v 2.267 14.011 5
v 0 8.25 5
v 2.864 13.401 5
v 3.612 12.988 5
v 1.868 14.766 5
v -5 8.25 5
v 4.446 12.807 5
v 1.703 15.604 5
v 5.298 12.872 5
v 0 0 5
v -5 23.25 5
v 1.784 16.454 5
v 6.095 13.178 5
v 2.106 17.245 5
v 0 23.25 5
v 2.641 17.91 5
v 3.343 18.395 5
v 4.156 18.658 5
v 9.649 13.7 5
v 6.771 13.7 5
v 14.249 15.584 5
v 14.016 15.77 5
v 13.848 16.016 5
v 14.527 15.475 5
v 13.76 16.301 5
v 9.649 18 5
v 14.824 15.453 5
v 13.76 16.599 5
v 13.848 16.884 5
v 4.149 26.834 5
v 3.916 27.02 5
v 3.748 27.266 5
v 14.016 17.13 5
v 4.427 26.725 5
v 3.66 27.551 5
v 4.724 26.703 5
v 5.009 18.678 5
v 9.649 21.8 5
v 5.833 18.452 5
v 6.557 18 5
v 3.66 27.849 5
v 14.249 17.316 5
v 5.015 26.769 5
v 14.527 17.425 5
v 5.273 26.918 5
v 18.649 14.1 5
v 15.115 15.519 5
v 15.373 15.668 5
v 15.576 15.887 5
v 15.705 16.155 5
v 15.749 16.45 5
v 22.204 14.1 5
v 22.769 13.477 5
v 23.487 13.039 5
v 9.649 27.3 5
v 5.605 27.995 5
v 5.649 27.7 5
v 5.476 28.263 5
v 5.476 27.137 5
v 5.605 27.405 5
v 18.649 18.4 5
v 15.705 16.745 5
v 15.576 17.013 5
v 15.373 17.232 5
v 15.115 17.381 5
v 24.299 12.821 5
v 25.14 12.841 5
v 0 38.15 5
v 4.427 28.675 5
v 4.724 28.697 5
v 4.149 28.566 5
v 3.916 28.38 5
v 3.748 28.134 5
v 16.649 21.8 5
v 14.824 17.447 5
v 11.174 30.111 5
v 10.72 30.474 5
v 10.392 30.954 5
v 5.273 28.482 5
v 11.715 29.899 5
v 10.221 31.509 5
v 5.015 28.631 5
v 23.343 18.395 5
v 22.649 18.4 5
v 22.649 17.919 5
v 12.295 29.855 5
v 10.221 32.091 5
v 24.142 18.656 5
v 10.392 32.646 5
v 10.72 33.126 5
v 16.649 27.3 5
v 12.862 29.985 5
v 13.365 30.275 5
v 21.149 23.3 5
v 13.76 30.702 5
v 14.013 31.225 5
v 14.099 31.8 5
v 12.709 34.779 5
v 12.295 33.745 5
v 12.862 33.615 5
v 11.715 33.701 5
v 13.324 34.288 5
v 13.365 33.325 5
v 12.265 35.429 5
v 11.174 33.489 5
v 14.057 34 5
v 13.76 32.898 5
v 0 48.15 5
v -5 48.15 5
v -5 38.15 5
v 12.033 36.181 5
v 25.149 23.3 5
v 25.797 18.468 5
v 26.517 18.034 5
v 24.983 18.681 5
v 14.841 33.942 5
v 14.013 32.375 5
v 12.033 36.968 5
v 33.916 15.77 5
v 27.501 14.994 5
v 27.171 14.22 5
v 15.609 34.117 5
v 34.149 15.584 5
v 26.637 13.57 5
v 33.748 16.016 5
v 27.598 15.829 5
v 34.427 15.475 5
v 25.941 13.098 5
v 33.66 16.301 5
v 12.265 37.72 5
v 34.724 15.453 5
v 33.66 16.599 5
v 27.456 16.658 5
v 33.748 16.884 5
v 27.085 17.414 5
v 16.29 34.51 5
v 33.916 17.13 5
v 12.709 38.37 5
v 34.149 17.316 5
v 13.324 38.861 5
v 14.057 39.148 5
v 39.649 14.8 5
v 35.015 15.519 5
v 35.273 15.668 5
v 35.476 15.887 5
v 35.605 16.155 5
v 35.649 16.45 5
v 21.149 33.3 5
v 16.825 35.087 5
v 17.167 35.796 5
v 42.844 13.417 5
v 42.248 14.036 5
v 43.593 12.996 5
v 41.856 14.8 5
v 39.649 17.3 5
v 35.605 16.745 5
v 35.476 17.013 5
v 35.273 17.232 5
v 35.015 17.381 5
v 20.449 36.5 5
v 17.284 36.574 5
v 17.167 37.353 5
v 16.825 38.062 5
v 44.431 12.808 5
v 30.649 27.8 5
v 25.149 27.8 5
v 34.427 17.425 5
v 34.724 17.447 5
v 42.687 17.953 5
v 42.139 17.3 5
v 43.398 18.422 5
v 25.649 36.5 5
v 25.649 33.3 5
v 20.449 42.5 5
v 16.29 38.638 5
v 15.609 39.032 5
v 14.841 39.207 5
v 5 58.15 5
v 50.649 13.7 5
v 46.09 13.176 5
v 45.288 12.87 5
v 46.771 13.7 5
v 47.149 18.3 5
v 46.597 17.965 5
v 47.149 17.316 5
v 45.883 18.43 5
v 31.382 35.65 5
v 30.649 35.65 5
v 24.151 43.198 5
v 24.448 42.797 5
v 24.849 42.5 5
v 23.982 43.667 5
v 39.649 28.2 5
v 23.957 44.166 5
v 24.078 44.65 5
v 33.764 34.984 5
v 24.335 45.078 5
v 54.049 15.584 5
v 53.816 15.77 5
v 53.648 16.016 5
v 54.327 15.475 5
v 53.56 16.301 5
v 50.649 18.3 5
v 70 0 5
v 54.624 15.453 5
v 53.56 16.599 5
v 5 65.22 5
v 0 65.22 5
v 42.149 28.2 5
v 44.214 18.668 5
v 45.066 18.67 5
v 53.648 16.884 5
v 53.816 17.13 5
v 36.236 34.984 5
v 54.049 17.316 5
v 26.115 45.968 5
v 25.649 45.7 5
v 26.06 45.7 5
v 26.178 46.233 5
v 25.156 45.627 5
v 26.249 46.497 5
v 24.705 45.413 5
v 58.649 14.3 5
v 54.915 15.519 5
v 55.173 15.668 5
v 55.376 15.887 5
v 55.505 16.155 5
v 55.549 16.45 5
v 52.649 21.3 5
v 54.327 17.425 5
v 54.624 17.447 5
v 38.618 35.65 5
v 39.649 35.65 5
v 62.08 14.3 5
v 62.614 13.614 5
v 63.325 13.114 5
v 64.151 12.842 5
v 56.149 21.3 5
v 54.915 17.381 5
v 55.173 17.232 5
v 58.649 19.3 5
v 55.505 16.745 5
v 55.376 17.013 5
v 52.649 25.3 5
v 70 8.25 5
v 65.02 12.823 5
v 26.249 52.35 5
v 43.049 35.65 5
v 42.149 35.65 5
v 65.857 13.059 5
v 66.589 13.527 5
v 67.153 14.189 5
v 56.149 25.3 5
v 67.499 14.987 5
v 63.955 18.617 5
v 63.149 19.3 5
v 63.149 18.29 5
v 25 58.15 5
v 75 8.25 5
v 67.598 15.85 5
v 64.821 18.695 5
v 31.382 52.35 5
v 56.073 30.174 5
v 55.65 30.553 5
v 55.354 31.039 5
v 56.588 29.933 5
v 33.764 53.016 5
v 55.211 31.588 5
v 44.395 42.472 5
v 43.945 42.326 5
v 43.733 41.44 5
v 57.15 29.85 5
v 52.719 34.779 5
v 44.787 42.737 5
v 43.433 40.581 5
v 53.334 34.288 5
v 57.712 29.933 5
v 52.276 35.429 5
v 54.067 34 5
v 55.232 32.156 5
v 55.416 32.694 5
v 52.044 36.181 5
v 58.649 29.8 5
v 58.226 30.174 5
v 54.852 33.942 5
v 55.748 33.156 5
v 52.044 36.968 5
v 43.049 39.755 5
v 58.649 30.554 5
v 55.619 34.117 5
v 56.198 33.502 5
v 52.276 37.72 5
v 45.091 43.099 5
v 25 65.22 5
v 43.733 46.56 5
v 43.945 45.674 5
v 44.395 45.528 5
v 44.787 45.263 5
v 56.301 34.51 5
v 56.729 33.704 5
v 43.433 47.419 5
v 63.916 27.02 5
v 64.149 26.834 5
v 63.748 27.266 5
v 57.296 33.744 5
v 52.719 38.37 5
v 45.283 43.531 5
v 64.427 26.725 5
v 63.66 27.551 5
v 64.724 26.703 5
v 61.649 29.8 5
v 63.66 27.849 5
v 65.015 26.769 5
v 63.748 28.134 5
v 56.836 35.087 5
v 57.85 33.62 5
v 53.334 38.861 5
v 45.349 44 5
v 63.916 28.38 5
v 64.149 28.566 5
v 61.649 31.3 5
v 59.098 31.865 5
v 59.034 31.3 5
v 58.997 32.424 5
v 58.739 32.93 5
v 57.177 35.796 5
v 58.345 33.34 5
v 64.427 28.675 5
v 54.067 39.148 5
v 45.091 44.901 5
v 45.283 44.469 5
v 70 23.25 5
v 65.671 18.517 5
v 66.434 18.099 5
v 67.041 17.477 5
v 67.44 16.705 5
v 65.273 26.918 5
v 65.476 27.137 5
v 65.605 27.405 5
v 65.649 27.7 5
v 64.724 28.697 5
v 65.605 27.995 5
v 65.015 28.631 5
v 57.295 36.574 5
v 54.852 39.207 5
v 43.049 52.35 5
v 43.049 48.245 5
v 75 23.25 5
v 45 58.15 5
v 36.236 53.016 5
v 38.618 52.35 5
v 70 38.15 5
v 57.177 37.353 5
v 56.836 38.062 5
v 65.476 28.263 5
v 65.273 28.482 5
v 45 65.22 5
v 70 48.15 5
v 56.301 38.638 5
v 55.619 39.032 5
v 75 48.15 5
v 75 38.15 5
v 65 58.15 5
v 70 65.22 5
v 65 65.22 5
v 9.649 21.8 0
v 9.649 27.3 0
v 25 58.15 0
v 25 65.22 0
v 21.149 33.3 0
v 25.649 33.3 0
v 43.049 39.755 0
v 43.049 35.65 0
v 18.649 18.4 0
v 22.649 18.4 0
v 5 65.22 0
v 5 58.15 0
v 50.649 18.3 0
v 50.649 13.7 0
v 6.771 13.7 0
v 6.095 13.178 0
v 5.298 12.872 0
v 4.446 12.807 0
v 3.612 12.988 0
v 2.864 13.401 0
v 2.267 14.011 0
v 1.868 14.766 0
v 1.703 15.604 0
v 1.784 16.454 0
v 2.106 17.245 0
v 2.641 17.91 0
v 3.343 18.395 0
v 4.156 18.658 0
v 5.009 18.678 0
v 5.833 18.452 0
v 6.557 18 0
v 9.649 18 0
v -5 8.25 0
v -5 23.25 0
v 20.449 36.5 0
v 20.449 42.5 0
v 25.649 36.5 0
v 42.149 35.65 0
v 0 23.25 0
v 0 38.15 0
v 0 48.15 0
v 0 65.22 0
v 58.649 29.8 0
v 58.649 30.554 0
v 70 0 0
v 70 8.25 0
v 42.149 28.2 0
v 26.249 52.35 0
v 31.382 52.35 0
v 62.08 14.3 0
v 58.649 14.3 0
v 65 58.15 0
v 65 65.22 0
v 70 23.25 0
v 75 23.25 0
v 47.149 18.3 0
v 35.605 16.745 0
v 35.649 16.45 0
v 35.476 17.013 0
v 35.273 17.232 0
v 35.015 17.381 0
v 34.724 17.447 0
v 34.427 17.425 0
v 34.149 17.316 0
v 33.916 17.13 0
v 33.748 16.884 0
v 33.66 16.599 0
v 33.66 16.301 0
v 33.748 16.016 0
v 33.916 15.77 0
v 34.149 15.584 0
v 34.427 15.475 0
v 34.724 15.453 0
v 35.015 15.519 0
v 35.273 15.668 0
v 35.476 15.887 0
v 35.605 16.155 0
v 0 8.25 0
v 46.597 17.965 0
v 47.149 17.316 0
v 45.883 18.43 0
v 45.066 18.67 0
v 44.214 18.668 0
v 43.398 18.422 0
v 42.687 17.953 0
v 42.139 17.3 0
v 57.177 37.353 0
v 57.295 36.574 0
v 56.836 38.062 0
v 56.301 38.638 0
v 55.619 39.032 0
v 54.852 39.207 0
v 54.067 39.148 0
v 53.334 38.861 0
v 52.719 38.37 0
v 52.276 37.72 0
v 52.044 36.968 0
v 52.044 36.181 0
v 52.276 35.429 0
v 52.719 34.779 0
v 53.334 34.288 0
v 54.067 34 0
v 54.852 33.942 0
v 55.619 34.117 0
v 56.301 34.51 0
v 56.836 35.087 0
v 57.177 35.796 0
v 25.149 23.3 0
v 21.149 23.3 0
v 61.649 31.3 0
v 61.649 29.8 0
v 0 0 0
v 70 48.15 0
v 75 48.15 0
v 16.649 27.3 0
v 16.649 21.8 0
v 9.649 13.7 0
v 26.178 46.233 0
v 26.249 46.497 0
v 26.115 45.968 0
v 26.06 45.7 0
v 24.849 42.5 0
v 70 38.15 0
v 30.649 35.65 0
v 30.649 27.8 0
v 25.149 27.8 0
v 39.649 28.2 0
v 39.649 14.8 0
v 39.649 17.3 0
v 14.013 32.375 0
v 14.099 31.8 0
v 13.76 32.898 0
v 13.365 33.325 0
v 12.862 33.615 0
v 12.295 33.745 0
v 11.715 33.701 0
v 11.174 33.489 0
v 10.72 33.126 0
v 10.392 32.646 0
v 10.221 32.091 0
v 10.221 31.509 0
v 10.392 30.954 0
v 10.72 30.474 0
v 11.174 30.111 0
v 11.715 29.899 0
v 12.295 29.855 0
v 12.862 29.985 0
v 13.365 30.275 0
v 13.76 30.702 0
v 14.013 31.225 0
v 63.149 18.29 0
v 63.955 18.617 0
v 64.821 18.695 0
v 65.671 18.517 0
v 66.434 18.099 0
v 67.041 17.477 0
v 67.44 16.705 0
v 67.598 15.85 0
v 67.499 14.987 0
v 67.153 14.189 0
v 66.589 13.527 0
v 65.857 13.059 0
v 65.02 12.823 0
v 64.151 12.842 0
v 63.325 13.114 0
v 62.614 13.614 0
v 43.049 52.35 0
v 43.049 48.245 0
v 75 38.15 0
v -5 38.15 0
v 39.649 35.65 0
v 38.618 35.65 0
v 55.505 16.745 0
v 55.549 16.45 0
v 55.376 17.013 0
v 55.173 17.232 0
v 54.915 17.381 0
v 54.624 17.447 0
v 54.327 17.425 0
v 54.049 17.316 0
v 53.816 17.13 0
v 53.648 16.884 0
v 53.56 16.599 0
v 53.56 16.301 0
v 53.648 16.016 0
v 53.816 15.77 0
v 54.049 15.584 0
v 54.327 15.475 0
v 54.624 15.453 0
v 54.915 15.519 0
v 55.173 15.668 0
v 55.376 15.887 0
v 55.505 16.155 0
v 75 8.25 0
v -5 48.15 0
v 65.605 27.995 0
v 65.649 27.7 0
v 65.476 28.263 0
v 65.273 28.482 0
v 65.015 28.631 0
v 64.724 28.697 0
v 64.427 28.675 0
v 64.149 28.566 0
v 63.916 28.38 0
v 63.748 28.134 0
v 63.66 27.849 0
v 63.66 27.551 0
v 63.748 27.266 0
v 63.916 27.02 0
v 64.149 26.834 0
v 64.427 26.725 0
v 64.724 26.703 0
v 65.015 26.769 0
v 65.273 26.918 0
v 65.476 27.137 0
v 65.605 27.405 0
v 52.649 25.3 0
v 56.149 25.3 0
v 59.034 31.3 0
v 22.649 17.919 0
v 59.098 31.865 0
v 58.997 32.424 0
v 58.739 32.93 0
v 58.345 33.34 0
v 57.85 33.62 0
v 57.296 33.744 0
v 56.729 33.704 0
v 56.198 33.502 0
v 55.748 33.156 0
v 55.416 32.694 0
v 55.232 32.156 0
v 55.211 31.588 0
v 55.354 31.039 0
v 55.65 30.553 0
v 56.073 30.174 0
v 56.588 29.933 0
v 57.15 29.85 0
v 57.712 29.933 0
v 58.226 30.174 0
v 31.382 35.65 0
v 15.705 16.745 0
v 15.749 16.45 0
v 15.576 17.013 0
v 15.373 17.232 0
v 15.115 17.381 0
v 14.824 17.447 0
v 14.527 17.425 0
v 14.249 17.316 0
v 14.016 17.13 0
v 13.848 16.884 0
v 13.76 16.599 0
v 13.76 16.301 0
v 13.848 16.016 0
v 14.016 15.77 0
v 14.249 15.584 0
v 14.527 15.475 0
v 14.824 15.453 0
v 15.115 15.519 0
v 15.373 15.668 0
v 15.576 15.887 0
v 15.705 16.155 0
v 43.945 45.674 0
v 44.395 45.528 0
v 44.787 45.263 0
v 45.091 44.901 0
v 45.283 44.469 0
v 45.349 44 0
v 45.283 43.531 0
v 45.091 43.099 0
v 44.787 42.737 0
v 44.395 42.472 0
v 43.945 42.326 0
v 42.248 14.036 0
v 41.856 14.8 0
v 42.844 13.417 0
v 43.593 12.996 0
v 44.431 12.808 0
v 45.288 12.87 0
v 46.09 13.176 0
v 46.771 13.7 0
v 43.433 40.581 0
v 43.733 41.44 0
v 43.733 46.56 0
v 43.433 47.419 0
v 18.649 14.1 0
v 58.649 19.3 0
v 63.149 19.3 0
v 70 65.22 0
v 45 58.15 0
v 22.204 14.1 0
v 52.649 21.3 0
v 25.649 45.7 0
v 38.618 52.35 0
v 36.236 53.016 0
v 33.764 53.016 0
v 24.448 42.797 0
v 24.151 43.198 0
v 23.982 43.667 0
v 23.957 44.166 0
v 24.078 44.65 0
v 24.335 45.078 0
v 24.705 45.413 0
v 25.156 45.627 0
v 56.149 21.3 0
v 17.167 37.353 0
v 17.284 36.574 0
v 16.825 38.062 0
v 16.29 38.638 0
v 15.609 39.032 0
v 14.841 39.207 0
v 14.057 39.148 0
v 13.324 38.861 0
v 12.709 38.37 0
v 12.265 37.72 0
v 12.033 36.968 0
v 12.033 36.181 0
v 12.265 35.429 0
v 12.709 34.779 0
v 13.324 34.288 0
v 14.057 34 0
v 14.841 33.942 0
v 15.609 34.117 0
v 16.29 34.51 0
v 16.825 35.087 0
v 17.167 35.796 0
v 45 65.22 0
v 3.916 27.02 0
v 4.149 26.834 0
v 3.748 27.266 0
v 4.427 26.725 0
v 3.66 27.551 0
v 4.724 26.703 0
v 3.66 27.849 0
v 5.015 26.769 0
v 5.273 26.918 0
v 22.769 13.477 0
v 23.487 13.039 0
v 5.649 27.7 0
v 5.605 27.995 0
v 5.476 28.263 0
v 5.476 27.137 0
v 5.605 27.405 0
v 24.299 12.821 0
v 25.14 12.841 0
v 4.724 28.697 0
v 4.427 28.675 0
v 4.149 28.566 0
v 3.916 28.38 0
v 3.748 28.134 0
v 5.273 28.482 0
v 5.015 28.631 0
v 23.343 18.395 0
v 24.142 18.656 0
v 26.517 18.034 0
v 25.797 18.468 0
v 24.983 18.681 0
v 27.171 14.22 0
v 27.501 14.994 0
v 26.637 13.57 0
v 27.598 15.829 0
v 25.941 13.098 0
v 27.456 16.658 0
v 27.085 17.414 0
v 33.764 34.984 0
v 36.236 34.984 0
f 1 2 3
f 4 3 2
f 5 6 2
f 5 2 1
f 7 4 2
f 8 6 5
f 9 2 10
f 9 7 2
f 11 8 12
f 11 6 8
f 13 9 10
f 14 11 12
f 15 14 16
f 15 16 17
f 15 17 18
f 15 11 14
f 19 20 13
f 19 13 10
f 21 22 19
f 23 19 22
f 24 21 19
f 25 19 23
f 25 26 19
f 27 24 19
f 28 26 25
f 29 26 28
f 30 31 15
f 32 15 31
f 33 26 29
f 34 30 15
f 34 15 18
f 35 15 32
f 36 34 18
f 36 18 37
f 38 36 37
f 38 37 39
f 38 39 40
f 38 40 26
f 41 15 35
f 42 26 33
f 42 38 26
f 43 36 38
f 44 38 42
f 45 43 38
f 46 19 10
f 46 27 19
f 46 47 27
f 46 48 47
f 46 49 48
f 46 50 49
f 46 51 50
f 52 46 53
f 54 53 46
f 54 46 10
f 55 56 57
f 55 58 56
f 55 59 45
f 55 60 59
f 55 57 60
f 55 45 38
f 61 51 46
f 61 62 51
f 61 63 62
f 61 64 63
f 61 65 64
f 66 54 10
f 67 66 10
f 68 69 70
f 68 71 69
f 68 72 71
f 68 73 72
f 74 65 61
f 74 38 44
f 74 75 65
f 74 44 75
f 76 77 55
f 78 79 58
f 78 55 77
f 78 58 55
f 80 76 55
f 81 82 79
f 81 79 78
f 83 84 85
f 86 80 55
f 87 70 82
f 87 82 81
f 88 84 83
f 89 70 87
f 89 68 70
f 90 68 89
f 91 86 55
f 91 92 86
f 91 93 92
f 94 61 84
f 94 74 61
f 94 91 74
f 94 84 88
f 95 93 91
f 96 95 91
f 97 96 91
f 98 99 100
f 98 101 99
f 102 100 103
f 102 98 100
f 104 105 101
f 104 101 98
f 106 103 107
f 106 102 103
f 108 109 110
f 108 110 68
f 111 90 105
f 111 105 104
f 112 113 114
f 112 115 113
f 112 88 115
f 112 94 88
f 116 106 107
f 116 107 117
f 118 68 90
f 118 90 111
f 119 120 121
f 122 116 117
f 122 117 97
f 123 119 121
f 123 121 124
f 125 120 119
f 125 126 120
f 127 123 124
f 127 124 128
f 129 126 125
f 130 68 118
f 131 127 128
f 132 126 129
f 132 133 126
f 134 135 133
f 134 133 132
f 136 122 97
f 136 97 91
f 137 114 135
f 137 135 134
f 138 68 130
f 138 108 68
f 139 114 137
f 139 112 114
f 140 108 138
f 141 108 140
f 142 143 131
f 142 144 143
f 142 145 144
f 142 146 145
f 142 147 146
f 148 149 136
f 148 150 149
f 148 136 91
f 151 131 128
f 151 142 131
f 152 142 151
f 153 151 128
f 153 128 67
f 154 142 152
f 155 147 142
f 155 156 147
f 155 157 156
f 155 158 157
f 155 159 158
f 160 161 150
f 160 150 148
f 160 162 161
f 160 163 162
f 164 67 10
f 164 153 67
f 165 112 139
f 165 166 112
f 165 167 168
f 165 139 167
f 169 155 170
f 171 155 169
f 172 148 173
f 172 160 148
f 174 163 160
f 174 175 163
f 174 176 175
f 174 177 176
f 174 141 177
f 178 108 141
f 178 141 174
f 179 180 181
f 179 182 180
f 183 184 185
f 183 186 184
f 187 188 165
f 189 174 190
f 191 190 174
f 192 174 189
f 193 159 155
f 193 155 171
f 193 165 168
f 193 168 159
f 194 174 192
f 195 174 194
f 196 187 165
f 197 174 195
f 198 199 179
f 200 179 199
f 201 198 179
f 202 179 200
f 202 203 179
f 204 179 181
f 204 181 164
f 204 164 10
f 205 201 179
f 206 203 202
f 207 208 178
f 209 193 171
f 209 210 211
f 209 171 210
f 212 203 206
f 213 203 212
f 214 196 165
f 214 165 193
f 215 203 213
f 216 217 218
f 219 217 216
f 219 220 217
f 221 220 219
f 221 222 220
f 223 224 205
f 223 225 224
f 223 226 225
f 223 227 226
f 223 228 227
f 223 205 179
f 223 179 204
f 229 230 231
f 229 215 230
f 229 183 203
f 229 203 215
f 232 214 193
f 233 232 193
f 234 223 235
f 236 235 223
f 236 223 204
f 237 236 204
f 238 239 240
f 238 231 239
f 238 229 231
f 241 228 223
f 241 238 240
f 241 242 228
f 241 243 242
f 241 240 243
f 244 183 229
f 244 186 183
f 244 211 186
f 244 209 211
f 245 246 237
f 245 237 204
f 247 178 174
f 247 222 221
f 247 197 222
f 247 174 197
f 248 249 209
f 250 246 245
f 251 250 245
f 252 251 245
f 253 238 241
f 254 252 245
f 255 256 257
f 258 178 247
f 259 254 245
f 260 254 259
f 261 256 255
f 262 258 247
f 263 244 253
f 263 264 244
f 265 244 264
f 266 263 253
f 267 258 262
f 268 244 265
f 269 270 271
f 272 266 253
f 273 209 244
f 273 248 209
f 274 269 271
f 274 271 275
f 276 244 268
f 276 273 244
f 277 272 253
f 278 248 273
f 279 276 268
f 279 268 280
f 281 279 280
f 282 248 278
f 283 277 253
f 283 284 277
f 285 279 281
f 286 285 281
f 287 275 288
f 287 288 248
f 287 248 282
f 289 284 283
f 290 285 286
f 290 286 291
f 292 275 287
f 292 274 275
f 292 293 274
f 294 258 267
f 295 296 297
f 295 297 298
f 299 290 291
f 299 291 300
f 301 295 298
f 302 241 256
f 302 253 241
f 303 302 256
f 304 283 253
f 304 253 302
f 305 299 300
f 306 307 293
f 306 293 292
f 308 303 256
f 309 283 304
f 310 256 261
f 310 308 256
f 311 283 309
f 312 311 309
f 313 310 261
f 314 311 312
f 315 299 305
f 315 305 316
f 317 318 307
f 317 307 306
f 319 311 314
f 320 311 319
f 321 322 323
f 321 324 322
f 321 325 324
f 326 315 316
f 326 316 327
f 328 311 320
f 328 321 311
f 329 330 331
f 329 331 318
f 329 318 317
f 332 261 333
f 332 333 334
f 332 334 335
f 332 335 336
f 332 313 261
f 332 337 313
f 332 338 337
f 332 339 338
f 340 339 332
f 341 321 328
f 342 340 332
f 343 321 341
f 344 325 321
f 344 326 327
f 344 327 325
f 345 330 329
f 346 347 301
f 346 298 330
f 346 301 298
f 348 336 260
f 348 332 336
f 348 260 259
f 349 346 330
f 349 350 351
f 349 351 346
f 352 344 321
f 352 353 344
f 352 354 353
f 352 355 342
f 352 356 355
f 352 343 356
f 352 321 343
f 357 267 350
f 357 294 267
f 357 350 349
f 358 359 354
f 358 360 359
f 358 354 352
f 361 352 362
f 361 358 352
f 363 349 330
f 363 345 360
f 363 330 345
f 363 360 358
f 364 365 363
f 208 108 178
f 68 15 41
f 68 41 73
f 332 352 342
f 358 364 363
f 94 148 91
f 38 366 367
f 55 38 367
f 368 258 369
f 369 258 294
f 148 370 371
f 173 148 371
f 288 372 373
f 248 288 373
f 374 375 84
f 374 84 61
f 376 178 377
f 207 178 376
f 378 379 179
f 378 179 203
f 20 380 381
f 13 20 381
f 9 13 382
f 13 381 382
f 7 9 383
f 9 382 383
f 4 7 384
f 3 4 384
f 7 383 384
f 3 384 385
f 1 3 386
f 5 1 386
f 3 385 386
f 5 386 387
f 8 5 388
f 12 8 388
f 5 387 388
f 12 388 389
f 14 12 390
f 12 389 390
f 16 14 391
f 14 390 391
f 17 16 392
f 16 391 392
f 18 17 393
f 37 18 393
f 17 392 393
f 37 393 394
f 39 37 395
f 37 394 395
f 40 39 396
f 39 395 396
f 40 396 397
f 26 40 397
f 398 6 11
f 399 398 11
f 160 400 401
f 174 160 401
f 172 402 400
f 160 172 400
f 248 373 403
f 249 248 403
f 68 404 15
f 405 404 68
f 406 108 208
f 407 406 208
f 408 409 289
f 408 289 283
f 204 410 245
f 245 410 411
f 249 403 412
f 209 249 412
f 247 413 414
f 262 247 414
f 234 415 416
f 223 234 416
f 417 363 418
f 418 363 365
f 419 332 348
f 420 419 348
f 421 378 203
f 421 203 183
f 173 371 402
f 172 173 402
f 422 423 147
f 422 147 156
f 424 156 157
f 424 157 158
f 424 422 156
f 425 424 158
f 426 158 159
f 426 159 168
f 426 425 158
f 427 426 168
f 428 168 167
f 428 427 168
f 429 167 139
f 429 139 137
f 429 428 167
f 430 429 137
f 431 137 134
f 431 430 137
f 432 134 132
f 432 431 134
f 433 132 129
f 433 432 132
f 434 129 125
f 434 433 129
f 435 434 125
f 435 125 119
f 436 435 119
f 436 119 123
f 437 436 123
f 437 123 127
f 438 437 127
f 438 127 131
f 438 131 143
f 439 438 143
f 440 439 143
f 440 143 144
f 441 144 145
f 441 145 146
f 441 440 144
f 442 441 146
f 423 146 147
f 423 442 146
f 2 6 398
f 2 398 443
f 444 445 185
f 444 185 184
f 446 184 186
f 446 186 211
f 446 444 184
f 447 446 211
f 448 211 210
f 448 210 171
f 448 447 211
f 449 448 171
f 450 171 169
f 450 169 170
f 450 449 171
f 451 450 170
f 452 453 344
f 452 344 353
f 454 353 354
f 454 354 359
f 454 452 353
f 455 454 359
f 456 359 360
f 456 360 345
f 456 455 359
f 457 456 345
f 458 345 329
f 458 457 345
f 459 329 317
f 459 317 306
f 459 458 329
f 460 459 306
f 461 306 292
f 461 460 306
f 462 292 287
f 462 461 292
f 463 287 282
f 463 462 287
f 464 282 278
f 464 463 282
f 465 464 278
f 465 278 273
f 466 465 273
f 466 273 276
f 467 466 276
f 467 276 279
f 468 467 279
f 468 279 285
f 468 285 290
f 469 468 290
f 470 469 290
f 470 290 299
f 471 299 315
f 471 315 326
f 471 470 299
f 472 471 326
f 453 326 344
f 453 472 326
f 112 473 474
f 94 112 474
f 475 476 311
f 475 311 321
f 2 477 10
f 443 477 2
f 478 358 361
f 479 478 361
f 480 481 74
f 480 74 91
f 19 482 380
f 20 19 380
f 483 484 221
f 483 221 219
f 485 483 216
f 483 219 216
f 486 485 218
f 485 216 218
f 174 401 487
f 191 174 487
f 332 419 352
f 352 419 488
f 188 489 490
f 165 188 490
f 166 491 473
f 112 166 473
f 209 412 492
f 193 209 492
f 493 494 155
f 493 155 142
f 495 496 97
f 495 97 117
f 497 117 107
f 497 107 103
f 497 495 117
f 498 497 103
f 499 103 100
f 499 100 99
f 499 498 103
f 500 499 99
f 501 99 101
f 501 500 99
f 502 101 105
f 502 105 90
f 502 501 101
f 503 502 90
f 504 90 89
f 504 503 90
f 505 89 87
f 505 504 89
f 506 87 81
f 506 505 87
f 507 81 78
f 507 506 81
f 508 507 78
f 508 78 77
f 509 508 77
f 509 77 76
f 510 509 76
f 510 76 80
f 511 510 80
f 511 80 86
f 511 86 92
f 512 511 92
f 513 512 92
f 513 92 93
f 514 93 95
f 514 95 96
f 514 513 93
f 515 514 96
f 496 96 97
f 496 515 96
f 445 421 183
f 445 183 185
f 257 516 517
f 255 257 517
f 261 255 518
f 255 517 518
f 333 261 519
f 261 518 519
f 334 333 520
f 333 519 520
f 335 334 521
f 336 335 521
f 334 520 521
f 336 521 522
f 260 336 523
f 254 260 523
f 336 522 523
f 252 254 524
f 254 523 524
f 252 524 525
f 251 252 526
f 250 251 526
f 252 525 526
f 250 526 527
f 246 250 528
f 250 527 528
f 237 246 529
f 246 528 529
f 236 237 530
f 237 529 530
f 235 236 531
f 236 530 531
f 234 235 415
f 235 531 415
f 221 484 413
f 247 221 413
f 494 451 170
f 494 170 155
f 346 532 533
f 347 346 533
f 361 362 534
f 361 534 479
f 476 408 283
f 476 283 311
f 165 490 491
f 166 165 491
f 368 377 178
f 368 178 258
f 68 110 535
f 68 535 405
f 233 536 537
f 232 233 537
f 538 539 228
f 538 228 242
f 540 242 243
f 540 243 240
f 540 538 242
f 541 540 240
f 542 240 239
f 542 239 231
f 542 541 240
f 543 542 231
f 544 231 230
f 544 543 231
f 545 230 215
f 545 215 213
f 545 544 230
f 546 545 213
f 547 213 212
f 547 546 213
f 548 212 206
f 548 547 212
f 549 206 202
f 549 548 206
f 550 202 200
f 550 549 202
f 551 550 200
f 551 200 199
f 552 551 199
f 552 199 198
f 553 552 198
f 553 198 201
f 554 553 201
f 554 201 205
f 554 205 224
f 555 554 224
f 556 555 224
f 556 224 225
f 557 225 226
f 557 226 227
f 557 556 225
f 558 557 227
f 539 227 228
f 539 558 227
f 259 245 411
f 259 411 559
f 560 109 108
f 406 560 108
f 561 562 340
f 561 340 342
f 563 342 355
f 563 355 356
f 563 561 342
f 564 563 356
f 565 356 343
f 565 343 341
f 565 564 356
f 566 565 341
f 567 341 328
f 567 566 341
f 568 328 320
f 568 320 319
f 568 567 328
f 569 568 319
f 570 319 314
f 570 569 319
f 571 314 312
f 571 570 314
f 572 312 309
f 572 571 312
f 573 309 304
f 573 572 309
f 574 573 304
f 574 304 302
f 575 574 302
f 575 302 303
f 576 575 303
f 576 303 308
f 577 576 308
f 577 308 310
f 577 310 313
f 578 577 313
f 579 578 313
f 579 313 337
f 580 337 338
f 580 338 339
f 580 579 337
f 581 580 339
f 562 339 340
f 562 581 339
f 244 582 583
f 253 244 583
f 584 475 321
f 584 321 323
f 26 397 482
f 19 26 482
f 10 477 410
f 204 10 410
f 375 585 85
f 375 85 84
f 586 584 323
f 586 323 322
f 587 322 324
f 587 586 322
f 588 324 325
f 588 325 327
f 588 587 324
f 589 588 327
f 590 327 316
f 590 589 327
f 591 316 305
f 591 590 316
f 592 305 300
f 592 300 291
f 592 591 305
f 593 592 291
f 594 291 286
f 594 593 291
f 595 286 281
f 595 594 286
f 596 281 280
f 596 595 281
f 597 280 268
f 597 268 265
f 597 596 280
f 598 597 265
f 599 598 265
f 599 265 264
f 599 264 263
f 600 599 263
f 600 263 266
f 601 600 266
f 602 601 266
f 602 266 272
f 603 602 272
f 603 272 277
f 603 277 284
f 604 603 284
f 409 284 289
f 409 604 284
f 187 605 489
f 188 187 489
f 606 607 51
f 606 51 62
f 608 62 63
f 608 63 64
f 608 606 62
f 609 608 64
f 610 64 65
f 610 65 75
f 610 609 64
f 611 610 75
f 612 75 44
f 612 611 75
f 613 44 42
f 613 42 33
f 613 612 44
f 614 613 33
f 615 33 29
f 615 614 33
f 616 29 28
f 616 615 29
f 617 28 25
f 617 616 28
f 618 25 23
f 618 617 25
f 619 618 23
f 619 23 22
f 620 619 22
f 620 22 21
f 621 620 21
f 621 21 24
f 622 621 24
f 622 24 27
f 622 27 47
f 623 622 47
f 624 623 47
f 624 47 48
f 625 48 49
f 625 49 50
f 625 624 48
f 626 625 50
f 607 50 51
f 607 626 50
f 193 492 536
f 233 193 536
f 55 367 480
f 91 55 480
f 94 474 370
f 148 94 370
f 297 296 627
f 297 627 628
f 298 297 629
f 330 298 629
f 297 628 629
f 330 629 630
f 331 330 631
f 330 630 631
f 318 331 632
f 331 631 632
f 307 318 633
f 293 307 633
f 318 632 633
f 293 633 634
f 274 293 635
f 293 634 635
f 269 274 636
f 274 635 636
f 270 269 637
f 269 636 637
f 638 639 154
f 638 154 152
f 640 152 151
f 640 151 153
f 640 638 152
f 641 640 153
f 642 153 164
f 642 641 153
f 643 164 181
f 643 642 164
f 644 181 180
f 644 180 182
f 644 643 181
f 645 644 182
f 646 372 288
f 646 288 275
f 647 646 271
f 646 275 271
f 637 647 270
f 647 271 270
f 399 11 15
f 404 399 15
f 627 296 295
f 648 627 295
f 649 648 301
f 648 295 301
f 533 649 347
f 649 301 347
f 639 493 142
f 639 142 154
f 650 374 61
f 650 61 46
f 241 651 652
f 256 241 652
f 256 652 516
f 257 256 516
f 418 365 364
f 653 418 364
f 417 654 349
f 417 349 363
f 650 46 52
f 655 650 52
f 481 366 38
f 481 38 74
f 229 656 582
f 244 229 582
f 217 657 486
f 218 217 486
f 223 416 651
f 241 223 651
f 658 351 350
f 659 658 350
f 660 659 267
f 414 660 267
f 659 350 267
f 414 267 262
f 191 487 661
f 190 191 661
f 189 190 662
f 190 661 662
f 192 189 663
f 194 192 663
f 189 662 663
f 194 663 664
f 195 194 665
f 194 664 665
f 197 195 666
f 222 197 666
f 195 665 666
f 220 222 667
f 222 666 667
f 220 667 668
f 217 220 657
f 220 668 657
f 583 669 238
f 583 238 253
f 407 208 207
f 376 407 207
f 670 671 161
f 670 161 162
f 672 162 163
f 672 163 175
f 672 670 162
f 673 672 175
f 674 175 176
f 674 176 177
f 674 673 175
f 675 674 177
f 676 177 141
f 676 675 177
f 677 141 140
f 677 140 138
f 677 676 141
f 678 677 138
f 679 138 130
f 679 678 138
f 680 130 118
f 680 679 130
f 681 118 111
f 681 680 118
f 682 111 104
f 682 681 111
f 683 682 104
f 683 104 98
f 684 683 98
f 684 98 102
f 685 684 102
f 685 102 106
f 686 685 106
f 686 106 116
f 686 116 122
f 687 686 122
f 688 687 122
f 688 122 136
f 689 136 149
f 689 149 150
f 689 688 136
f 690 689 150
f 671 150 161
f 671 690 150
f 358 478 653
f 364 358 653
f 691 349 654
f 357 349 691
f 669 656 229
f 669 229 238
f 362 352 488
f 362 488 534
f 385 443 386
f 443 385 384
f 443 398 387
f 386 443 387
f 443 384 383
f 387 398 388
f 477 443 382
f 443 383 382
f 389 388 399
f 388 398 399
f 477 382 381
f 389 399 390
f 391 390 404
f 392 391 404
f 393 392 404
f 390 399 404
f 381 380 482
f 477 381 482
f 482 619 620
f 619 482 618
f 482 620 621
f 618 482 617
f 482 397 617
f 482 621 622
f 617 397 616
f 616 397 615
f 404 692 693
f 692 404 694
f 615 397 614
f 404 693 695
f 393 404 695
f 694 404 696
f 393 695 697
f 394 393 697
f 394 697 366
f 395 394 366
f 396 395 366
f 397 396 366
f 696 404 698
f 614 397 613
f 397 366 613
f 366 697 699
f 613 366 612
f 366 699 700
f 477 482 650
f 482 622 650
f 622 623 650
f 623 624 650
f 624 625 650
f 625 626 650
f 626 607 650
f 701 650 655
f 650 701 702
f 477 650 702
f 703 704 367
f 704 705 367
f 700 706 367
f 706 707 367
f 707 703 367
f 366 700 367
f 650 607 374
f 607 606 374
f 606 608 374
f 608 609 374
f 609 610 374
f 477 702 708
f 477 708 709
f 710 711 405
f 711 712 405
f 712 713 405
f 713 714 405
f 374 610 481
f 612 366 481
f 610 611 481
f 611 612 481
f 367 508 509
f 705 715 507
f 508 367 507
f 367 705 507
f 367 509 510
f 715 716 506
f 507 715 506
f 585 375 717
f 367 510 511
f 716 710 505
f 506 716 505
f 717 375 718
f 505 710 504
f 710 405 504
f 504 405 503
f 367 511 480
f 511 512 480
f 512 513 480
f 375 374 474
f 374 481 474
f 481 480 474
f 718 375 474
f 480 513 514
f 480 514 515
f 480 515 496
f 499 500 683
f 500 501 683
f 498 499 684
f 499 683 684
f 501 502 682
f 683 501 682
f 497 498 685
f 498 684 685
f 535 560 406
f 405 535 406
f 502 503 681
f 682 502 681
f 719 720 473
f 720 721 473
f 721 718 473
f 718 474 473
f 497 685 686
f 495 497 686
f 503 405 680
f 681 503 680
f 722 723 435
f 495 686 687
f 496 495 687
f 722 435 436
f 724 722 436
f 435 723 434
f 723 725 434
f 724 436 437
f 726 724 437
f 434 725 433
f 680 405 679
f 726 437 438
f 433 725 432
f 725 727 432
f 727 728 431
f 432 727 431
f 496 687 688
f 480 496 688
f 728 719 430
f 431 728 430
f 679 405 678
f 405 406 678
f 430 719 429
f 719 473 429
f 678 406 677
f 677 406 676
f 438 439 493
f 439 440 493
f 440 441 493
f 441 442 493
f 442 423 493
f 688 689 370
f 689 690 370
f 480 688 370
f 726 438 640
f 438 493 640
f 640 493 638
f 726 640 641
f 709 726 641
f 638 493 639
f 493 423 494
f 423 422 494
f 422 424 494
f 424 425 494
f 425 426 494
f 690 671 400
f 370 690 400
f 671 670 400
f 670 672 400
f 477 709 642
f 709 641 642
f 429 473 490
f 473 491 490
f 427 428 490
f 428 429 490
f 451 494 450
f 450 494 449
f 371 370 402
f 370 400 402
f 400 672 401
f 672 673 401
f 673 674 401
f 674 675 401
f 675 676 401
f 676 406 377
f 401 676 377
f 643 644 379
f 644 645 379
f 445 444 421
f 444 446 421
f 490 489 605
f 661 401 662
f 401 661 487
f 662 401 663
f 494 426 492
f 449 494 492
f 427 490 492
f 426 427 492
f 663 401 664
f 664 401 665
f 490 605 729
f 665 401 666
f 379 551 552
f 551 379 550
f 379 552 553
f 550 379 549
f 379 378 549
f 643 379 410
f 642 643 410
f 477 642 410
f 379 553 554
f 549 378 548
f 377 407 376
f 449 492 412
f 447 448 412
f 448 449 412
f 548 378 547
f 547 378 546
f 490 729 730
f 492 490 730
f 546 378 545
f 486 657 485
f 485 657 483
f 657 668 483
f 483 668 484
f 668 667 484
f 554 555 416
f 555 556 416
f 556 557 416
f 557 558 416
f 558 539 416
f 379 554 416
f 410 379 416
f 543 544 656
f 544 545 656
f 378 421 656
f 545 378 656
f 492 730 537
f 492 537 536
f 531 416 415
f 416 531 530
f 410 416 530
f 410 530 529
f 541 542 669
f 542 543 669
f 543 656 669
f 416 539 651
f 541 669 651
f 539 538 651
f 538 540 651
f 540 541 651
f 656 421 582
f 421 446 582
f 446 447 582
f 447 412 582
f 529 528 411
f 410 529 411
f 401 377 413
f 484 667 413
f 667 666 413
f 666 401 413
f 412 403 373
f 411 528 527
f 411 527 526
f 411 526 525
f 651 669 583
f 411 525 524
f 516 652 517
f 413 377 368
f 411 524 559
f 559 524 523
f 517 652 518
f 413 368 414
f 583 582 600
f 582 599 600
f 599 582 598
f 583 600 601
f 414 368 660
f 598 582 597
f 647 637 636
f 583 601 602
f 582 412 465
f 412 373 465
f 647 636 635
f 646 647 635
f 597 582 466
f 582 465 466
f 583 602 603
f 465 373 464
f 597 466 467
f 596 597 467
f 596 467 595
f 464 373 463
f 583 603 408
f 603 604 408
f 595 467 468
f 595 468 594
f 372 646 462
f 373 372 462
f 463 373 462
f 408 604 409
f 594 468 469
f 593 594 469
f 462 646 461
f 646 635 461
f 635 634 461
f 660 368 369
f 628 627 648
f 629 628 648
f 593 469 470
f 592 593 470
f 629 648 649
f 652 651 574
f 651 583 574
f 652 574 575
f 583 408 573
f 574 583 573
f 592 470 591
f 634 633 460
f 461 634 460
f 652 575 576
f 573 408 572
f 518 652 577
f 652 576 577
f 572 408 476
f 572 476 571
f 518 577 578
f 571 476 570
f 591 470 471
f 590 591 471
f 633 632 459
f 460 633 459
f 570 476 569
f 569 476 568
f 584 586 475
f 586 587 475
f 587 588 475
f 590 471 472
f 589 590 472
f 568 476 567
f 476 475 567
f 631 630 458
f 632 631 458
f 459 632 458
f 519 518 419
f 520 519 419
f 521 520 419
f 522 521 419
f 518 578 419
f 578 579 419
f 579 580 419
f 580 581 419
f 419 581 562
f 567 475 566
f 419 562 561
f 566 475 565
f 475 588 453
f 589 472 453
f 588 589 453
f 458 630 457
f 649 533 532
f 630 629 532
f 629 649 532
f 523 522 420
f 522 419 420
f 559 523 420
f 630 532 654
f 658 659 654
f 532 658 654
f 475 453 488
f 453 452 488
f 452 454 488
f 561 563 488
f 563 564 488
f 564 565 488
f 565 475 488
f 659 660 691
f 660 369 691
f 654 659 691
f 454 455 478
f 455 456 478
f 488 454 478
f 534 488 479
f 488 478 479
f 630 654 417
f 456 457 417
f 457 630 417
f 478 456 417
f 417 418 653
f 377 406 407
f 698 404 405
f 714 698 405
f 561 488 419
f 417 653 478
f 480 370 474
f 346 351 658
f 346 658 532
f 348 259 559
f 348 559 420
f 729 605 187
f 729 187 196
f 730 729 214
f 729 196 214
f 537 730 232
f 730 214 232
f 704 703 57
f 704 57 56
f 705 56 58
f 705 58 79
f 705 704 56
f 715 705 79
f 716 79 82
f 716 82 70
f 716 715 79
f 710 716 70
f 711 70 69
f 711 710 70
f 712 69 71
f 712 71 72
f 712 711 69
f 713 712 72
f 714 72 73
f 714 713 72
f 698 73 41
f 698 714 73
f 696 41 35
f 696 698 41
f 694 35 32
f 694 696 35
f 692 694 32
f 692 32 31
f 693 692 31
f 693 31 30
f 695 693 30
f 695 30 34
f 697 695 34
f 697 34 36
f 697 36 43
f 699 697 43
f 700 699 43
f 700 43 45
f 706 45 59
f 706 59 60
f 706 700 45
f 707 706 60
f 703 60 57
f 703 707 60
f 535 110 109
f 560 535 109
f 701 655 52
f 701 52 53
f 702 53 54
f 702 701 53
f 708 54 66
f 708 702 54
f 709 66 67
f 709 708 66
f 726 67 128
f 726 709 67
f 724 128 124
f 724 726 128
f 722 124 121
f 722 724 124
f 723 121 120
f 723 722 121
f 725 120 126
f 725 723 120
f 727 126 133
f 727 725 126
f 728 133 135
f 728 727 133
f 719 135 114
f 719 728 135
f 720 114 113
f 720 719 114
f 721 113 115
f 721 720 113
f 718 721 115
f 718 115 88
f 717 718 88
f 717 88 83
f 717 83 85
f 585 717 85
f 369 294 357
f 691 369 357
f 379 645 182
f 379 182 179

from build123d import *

# Parameters (mm, degrees)
ESQUISSE1_W        = 70
ESQUISSE1_H        = 58.15
ESQUISSE1_R        = 1.95
ESQUISSE1_R_2      = 1
ESQUISSE1_R_3      = 2.640146182
ESQUISSE1_W_2      = 7
ESQUISSE1_H_2      = 5.5
ESQUISSE1_W_3      = 3.5
ESQUISSE1_H_3      = 4
BOSS_EXTRU_1_DEPTH = 5
ESQUISSE2_R        = 9.1
CR_NEAUX_DEPTH     = 5
ESQUISSE3_W        = 20
ESQUISSE3_H        = 7.07
ESQUISSE3_W_2      = 5
ESQUISSE3_H_2      = 15
ESQUISSE3_H_3      = 10
CR_NEAUX_2_DEPTH   = 5


with BuildPart() as part:
    # Esquisse1 → Boss.-Extru.1 (new body)
    with BuildSketch(Plane.XY):
        with Locations((35, 29.075)):
            Rectangle(ESQUISSE1_W, ESQUISSE1_H)
        with Locations((12.149282213, 31.8)):
            Circle(ESQUISSE1_R, mode=Mode.SUBTRACT)
        with Locations((4.649282213, 27.7)):
            Circle(ESQUISSE1_R_2, mode=Mode.SUBTRACT)
        with Locations((14.749282213, 16.45)):
            Circle(ESQUISSE1_R_2, mode=Mode.SUBTRACT)
        with Locations((34.649282213, 16.45)):
            Circle(ESQUISSE1_R_2, mode=Mode.SUBTRACT)
        with Locations((54.549282213, 16.45)):
            Circle(ESQUISSE1_R_2, mode=Mode.SUBTRACT)
        with Locations((64.649282213, 27.7)):
            Circle(ESQUISSE1_R_2, mode=Mode.SUBTRACT)
        with Locations((54.654459148, 36.574348259)):
            Circle(ESQUISSE1_R_3, mode=Mode.SUBTRACT)
        with Locations((14.644105278, 36.574348259)):
            Circle(ESQUISSE1_R_3, mode=Mode.SUBTRACT)
        with BuildLine():
            Line((26.249282245, 52.35), (43.049282245, 52.35))
            Line((43.049282245, 52.35), (43.049282245, 45.7))
            Line((43.049282245, 45.7), (43.649282213, 45.7))
            ThreePointArc((43.649282213, 45.7), (45.349282213, 44), (43.649282213, 42.3))
            Line((43.649282213, 42.3), (43.049282218, 42.3))
            Line((43.049282218, 42.3), (43.049282218, 35.65))
            Line((43.049282218, 35.65), (42.149282213, 35.65))
            Line((42.149282213, 35.65), (42.149282213, 28.2))
            Line((42.149282213, 28.2), (39.649282213, 28.2))
            Line((39.649282213, 28.2), (39.649282213, 35.65))
            Line((39.649282213, 35.65), (30.649282213, 35.65))
            Line((30.649282213, 35.65), (30.649282213, 27.8))
            Line((30.649282213, 27.8), (25.149282213, 27.8))
            Line((25.149282213, 27.8), (25.149282213, 23.3))
            Line((25.149282213, 23.3), (21.149282213, 23.3))
            Line((21.149282213, 23.3), (21.149282213, 33.3))
            Line((21.149282213, 33.3), (25.649282213, 33.3))
            Line((25.649282213, 33.3), (25.649282213, 36.5))
            Line((25.649282213, 36.5), (20.449282213, 36.5))
            Line((20.449282213, 36.5), (20.449282213, 42.5))
            Line((20.449282213, 42.5), (24.849282213, 42.5))
            ThreePointArc((24.849282213, 42.5), (24.000039995, 44.412310574), (25.64928225, 45.7))
            Line((25.64928225, 45.7), (26.249282245, 45.7))
            Line((26.249282245, 45.7), (26.249282245, 52.35))
        make_face(mode=Mode.SUBTRACT)
        with Locations((13.149282213, 24.55)):
            Rectangle(ESQUISSE1_W_2, ESQUISSE1_H_2, mode=Mode.SUBTRACT)
        with BuildLine():
            Line((6.557160615, 18), (9.649282213, 18))
            Line((9.649282213, 18), (9.649282213, 13.7))
            Line((9.649282213, 13.7), (6.770602556, 13.7))
            ThreePointArc((6.770602556, 13.7), (1.702909759, 15.603748964), (6.557160615, 18))
        make_face(mode=Mode.SUBTRACT)
        with BuildLine():
            Line((22.649282213, 17.918524844), (22.649282213, 18.4))
            Line((22.649282213, 18.4), (18.649282213, 18.4))
            Line((18.649282213, 18.4), (18.649282213, 14.1))
            Line((18.649282213, 14.1), (22.20387836, 14.1))
            ThreePointArc((22.20387836, 14.1), (27.579416484, 15.40822061), (22.649282213, 17.918524844))
        make_face(mode=Mode.SUBTRACT)
        with BuildLine():
            Line((42.139302133, 17.3), (39.649282213, 17.3))
            Line((39.649282213, 17.3), (39.649282213, 14.8))
            Line((39.649282213, 14.8), (41.856434204, 14.8))
            ThreePointArc((41.856434204, 14.8), (44.004893082, 12.87123939), (46.770602556, 13.7))
            Line((46.770602556, 13.7), (50.649282213, 13.7))
            Line((50.649282213, 13.7), (50.649282213, 18.3))
            Line((50.649282213, 18.3), (47.149282213, 18.3))
            Line((47.149282213, 18.3), (47.149282213, 17.316045976))
            ThreePointArc((47.149282213, 17.316045976), (44.639833994, 18.69998487), (42.139302133, 17.3))
        make_face(mode=Mode.SUBTRACT)
        with Locations((54.399282213, 23.3)):
            Rectangle(ESQUISSE1_W_3, ESQUISSE1_H_3, mode=Mode.SUBTRACT)
        with BuildLine():
            Line((58.649282213, 30.554006421), (58.649282213, 29.8))
            Line((58.649282213, 29.8), (61.649282213, 29.8))
            Line((61.649282213, 29.8), (61.649282213, 31.3))
            Line((61.649282213, 31.3), (59.034089895, 31.3))
            ThreePointArc((59.034089895, 31.3), (55.416262488, 32.69394778), (58.649282213, 30.554006421))
        make_face(mode=Mode.SUBTRACT)
        with BuildLine():
            Line((63.149282213, 19.3), (63.149282213, 18.290177159))
            ThreePointArc((63.149282213, 18.290177159), (67.498784507, 14.986562594), (62.080235697, 14.3))
            Line((62.080235697, 14.3), (58.649282213, 14.3))
            Line((58.649282213, 14.3), (58.649282213, 19.3))
            Line((58.649282213, 19.3), (63.149282213, 19.3))
        make_face(mode=Mode.SUBTRACT)
    extrude(amount=BOSS_EXTRU_1_DEPTH)

    # Esquisse2 → Cr_neaux (cut)
    with BuildSketch(Plane.XY.offset(5)):
        with Locations((35, 44)):
            Circle(ESQUISSE2_R)
    extrude(amount=-CR_NEAUX_DEPTH, mode=Mode.SUBTRACT)

    # Esquisse3 → Cr_neaux 2 (add)
    with BuildSketch(Plane.XY.offset(5)):
        with Locations((35, 61.685)):
            Rectangle(ESQUISSE3_W, ESQUISSE3_H)
        with Locations((2.5, 61.685)):
            Rectangle(ESQUISSE3_W_2, ESQUISSE3_H)
        with Locations((-2.5, 15.75)):
            Rectangle(ESQUISSE3_W_2, ESQUISSE3_H_2)
        with Locations((-2.5, 43.15)):
            Rectangle(ESQUISSE3_W_2, ESQUISSE3_H_3)
        with Locations((72.5, 43.15)):
            Rectangle(ESQUISSE3_W_2, ESQUISSE3_H_3)
        with Locations((72.5, 15.75)):
            Rectangle(ESQUISSE3_W_2, ESQUISSE3_H_2)
        with Locations((67.5, 61.685)):
            Rectangle(ESQUISSE3_W_2, ESQUISSE3_H)
    extrude(amount=-CR_NEAUX_2_DEPTH)


solid = part.part
